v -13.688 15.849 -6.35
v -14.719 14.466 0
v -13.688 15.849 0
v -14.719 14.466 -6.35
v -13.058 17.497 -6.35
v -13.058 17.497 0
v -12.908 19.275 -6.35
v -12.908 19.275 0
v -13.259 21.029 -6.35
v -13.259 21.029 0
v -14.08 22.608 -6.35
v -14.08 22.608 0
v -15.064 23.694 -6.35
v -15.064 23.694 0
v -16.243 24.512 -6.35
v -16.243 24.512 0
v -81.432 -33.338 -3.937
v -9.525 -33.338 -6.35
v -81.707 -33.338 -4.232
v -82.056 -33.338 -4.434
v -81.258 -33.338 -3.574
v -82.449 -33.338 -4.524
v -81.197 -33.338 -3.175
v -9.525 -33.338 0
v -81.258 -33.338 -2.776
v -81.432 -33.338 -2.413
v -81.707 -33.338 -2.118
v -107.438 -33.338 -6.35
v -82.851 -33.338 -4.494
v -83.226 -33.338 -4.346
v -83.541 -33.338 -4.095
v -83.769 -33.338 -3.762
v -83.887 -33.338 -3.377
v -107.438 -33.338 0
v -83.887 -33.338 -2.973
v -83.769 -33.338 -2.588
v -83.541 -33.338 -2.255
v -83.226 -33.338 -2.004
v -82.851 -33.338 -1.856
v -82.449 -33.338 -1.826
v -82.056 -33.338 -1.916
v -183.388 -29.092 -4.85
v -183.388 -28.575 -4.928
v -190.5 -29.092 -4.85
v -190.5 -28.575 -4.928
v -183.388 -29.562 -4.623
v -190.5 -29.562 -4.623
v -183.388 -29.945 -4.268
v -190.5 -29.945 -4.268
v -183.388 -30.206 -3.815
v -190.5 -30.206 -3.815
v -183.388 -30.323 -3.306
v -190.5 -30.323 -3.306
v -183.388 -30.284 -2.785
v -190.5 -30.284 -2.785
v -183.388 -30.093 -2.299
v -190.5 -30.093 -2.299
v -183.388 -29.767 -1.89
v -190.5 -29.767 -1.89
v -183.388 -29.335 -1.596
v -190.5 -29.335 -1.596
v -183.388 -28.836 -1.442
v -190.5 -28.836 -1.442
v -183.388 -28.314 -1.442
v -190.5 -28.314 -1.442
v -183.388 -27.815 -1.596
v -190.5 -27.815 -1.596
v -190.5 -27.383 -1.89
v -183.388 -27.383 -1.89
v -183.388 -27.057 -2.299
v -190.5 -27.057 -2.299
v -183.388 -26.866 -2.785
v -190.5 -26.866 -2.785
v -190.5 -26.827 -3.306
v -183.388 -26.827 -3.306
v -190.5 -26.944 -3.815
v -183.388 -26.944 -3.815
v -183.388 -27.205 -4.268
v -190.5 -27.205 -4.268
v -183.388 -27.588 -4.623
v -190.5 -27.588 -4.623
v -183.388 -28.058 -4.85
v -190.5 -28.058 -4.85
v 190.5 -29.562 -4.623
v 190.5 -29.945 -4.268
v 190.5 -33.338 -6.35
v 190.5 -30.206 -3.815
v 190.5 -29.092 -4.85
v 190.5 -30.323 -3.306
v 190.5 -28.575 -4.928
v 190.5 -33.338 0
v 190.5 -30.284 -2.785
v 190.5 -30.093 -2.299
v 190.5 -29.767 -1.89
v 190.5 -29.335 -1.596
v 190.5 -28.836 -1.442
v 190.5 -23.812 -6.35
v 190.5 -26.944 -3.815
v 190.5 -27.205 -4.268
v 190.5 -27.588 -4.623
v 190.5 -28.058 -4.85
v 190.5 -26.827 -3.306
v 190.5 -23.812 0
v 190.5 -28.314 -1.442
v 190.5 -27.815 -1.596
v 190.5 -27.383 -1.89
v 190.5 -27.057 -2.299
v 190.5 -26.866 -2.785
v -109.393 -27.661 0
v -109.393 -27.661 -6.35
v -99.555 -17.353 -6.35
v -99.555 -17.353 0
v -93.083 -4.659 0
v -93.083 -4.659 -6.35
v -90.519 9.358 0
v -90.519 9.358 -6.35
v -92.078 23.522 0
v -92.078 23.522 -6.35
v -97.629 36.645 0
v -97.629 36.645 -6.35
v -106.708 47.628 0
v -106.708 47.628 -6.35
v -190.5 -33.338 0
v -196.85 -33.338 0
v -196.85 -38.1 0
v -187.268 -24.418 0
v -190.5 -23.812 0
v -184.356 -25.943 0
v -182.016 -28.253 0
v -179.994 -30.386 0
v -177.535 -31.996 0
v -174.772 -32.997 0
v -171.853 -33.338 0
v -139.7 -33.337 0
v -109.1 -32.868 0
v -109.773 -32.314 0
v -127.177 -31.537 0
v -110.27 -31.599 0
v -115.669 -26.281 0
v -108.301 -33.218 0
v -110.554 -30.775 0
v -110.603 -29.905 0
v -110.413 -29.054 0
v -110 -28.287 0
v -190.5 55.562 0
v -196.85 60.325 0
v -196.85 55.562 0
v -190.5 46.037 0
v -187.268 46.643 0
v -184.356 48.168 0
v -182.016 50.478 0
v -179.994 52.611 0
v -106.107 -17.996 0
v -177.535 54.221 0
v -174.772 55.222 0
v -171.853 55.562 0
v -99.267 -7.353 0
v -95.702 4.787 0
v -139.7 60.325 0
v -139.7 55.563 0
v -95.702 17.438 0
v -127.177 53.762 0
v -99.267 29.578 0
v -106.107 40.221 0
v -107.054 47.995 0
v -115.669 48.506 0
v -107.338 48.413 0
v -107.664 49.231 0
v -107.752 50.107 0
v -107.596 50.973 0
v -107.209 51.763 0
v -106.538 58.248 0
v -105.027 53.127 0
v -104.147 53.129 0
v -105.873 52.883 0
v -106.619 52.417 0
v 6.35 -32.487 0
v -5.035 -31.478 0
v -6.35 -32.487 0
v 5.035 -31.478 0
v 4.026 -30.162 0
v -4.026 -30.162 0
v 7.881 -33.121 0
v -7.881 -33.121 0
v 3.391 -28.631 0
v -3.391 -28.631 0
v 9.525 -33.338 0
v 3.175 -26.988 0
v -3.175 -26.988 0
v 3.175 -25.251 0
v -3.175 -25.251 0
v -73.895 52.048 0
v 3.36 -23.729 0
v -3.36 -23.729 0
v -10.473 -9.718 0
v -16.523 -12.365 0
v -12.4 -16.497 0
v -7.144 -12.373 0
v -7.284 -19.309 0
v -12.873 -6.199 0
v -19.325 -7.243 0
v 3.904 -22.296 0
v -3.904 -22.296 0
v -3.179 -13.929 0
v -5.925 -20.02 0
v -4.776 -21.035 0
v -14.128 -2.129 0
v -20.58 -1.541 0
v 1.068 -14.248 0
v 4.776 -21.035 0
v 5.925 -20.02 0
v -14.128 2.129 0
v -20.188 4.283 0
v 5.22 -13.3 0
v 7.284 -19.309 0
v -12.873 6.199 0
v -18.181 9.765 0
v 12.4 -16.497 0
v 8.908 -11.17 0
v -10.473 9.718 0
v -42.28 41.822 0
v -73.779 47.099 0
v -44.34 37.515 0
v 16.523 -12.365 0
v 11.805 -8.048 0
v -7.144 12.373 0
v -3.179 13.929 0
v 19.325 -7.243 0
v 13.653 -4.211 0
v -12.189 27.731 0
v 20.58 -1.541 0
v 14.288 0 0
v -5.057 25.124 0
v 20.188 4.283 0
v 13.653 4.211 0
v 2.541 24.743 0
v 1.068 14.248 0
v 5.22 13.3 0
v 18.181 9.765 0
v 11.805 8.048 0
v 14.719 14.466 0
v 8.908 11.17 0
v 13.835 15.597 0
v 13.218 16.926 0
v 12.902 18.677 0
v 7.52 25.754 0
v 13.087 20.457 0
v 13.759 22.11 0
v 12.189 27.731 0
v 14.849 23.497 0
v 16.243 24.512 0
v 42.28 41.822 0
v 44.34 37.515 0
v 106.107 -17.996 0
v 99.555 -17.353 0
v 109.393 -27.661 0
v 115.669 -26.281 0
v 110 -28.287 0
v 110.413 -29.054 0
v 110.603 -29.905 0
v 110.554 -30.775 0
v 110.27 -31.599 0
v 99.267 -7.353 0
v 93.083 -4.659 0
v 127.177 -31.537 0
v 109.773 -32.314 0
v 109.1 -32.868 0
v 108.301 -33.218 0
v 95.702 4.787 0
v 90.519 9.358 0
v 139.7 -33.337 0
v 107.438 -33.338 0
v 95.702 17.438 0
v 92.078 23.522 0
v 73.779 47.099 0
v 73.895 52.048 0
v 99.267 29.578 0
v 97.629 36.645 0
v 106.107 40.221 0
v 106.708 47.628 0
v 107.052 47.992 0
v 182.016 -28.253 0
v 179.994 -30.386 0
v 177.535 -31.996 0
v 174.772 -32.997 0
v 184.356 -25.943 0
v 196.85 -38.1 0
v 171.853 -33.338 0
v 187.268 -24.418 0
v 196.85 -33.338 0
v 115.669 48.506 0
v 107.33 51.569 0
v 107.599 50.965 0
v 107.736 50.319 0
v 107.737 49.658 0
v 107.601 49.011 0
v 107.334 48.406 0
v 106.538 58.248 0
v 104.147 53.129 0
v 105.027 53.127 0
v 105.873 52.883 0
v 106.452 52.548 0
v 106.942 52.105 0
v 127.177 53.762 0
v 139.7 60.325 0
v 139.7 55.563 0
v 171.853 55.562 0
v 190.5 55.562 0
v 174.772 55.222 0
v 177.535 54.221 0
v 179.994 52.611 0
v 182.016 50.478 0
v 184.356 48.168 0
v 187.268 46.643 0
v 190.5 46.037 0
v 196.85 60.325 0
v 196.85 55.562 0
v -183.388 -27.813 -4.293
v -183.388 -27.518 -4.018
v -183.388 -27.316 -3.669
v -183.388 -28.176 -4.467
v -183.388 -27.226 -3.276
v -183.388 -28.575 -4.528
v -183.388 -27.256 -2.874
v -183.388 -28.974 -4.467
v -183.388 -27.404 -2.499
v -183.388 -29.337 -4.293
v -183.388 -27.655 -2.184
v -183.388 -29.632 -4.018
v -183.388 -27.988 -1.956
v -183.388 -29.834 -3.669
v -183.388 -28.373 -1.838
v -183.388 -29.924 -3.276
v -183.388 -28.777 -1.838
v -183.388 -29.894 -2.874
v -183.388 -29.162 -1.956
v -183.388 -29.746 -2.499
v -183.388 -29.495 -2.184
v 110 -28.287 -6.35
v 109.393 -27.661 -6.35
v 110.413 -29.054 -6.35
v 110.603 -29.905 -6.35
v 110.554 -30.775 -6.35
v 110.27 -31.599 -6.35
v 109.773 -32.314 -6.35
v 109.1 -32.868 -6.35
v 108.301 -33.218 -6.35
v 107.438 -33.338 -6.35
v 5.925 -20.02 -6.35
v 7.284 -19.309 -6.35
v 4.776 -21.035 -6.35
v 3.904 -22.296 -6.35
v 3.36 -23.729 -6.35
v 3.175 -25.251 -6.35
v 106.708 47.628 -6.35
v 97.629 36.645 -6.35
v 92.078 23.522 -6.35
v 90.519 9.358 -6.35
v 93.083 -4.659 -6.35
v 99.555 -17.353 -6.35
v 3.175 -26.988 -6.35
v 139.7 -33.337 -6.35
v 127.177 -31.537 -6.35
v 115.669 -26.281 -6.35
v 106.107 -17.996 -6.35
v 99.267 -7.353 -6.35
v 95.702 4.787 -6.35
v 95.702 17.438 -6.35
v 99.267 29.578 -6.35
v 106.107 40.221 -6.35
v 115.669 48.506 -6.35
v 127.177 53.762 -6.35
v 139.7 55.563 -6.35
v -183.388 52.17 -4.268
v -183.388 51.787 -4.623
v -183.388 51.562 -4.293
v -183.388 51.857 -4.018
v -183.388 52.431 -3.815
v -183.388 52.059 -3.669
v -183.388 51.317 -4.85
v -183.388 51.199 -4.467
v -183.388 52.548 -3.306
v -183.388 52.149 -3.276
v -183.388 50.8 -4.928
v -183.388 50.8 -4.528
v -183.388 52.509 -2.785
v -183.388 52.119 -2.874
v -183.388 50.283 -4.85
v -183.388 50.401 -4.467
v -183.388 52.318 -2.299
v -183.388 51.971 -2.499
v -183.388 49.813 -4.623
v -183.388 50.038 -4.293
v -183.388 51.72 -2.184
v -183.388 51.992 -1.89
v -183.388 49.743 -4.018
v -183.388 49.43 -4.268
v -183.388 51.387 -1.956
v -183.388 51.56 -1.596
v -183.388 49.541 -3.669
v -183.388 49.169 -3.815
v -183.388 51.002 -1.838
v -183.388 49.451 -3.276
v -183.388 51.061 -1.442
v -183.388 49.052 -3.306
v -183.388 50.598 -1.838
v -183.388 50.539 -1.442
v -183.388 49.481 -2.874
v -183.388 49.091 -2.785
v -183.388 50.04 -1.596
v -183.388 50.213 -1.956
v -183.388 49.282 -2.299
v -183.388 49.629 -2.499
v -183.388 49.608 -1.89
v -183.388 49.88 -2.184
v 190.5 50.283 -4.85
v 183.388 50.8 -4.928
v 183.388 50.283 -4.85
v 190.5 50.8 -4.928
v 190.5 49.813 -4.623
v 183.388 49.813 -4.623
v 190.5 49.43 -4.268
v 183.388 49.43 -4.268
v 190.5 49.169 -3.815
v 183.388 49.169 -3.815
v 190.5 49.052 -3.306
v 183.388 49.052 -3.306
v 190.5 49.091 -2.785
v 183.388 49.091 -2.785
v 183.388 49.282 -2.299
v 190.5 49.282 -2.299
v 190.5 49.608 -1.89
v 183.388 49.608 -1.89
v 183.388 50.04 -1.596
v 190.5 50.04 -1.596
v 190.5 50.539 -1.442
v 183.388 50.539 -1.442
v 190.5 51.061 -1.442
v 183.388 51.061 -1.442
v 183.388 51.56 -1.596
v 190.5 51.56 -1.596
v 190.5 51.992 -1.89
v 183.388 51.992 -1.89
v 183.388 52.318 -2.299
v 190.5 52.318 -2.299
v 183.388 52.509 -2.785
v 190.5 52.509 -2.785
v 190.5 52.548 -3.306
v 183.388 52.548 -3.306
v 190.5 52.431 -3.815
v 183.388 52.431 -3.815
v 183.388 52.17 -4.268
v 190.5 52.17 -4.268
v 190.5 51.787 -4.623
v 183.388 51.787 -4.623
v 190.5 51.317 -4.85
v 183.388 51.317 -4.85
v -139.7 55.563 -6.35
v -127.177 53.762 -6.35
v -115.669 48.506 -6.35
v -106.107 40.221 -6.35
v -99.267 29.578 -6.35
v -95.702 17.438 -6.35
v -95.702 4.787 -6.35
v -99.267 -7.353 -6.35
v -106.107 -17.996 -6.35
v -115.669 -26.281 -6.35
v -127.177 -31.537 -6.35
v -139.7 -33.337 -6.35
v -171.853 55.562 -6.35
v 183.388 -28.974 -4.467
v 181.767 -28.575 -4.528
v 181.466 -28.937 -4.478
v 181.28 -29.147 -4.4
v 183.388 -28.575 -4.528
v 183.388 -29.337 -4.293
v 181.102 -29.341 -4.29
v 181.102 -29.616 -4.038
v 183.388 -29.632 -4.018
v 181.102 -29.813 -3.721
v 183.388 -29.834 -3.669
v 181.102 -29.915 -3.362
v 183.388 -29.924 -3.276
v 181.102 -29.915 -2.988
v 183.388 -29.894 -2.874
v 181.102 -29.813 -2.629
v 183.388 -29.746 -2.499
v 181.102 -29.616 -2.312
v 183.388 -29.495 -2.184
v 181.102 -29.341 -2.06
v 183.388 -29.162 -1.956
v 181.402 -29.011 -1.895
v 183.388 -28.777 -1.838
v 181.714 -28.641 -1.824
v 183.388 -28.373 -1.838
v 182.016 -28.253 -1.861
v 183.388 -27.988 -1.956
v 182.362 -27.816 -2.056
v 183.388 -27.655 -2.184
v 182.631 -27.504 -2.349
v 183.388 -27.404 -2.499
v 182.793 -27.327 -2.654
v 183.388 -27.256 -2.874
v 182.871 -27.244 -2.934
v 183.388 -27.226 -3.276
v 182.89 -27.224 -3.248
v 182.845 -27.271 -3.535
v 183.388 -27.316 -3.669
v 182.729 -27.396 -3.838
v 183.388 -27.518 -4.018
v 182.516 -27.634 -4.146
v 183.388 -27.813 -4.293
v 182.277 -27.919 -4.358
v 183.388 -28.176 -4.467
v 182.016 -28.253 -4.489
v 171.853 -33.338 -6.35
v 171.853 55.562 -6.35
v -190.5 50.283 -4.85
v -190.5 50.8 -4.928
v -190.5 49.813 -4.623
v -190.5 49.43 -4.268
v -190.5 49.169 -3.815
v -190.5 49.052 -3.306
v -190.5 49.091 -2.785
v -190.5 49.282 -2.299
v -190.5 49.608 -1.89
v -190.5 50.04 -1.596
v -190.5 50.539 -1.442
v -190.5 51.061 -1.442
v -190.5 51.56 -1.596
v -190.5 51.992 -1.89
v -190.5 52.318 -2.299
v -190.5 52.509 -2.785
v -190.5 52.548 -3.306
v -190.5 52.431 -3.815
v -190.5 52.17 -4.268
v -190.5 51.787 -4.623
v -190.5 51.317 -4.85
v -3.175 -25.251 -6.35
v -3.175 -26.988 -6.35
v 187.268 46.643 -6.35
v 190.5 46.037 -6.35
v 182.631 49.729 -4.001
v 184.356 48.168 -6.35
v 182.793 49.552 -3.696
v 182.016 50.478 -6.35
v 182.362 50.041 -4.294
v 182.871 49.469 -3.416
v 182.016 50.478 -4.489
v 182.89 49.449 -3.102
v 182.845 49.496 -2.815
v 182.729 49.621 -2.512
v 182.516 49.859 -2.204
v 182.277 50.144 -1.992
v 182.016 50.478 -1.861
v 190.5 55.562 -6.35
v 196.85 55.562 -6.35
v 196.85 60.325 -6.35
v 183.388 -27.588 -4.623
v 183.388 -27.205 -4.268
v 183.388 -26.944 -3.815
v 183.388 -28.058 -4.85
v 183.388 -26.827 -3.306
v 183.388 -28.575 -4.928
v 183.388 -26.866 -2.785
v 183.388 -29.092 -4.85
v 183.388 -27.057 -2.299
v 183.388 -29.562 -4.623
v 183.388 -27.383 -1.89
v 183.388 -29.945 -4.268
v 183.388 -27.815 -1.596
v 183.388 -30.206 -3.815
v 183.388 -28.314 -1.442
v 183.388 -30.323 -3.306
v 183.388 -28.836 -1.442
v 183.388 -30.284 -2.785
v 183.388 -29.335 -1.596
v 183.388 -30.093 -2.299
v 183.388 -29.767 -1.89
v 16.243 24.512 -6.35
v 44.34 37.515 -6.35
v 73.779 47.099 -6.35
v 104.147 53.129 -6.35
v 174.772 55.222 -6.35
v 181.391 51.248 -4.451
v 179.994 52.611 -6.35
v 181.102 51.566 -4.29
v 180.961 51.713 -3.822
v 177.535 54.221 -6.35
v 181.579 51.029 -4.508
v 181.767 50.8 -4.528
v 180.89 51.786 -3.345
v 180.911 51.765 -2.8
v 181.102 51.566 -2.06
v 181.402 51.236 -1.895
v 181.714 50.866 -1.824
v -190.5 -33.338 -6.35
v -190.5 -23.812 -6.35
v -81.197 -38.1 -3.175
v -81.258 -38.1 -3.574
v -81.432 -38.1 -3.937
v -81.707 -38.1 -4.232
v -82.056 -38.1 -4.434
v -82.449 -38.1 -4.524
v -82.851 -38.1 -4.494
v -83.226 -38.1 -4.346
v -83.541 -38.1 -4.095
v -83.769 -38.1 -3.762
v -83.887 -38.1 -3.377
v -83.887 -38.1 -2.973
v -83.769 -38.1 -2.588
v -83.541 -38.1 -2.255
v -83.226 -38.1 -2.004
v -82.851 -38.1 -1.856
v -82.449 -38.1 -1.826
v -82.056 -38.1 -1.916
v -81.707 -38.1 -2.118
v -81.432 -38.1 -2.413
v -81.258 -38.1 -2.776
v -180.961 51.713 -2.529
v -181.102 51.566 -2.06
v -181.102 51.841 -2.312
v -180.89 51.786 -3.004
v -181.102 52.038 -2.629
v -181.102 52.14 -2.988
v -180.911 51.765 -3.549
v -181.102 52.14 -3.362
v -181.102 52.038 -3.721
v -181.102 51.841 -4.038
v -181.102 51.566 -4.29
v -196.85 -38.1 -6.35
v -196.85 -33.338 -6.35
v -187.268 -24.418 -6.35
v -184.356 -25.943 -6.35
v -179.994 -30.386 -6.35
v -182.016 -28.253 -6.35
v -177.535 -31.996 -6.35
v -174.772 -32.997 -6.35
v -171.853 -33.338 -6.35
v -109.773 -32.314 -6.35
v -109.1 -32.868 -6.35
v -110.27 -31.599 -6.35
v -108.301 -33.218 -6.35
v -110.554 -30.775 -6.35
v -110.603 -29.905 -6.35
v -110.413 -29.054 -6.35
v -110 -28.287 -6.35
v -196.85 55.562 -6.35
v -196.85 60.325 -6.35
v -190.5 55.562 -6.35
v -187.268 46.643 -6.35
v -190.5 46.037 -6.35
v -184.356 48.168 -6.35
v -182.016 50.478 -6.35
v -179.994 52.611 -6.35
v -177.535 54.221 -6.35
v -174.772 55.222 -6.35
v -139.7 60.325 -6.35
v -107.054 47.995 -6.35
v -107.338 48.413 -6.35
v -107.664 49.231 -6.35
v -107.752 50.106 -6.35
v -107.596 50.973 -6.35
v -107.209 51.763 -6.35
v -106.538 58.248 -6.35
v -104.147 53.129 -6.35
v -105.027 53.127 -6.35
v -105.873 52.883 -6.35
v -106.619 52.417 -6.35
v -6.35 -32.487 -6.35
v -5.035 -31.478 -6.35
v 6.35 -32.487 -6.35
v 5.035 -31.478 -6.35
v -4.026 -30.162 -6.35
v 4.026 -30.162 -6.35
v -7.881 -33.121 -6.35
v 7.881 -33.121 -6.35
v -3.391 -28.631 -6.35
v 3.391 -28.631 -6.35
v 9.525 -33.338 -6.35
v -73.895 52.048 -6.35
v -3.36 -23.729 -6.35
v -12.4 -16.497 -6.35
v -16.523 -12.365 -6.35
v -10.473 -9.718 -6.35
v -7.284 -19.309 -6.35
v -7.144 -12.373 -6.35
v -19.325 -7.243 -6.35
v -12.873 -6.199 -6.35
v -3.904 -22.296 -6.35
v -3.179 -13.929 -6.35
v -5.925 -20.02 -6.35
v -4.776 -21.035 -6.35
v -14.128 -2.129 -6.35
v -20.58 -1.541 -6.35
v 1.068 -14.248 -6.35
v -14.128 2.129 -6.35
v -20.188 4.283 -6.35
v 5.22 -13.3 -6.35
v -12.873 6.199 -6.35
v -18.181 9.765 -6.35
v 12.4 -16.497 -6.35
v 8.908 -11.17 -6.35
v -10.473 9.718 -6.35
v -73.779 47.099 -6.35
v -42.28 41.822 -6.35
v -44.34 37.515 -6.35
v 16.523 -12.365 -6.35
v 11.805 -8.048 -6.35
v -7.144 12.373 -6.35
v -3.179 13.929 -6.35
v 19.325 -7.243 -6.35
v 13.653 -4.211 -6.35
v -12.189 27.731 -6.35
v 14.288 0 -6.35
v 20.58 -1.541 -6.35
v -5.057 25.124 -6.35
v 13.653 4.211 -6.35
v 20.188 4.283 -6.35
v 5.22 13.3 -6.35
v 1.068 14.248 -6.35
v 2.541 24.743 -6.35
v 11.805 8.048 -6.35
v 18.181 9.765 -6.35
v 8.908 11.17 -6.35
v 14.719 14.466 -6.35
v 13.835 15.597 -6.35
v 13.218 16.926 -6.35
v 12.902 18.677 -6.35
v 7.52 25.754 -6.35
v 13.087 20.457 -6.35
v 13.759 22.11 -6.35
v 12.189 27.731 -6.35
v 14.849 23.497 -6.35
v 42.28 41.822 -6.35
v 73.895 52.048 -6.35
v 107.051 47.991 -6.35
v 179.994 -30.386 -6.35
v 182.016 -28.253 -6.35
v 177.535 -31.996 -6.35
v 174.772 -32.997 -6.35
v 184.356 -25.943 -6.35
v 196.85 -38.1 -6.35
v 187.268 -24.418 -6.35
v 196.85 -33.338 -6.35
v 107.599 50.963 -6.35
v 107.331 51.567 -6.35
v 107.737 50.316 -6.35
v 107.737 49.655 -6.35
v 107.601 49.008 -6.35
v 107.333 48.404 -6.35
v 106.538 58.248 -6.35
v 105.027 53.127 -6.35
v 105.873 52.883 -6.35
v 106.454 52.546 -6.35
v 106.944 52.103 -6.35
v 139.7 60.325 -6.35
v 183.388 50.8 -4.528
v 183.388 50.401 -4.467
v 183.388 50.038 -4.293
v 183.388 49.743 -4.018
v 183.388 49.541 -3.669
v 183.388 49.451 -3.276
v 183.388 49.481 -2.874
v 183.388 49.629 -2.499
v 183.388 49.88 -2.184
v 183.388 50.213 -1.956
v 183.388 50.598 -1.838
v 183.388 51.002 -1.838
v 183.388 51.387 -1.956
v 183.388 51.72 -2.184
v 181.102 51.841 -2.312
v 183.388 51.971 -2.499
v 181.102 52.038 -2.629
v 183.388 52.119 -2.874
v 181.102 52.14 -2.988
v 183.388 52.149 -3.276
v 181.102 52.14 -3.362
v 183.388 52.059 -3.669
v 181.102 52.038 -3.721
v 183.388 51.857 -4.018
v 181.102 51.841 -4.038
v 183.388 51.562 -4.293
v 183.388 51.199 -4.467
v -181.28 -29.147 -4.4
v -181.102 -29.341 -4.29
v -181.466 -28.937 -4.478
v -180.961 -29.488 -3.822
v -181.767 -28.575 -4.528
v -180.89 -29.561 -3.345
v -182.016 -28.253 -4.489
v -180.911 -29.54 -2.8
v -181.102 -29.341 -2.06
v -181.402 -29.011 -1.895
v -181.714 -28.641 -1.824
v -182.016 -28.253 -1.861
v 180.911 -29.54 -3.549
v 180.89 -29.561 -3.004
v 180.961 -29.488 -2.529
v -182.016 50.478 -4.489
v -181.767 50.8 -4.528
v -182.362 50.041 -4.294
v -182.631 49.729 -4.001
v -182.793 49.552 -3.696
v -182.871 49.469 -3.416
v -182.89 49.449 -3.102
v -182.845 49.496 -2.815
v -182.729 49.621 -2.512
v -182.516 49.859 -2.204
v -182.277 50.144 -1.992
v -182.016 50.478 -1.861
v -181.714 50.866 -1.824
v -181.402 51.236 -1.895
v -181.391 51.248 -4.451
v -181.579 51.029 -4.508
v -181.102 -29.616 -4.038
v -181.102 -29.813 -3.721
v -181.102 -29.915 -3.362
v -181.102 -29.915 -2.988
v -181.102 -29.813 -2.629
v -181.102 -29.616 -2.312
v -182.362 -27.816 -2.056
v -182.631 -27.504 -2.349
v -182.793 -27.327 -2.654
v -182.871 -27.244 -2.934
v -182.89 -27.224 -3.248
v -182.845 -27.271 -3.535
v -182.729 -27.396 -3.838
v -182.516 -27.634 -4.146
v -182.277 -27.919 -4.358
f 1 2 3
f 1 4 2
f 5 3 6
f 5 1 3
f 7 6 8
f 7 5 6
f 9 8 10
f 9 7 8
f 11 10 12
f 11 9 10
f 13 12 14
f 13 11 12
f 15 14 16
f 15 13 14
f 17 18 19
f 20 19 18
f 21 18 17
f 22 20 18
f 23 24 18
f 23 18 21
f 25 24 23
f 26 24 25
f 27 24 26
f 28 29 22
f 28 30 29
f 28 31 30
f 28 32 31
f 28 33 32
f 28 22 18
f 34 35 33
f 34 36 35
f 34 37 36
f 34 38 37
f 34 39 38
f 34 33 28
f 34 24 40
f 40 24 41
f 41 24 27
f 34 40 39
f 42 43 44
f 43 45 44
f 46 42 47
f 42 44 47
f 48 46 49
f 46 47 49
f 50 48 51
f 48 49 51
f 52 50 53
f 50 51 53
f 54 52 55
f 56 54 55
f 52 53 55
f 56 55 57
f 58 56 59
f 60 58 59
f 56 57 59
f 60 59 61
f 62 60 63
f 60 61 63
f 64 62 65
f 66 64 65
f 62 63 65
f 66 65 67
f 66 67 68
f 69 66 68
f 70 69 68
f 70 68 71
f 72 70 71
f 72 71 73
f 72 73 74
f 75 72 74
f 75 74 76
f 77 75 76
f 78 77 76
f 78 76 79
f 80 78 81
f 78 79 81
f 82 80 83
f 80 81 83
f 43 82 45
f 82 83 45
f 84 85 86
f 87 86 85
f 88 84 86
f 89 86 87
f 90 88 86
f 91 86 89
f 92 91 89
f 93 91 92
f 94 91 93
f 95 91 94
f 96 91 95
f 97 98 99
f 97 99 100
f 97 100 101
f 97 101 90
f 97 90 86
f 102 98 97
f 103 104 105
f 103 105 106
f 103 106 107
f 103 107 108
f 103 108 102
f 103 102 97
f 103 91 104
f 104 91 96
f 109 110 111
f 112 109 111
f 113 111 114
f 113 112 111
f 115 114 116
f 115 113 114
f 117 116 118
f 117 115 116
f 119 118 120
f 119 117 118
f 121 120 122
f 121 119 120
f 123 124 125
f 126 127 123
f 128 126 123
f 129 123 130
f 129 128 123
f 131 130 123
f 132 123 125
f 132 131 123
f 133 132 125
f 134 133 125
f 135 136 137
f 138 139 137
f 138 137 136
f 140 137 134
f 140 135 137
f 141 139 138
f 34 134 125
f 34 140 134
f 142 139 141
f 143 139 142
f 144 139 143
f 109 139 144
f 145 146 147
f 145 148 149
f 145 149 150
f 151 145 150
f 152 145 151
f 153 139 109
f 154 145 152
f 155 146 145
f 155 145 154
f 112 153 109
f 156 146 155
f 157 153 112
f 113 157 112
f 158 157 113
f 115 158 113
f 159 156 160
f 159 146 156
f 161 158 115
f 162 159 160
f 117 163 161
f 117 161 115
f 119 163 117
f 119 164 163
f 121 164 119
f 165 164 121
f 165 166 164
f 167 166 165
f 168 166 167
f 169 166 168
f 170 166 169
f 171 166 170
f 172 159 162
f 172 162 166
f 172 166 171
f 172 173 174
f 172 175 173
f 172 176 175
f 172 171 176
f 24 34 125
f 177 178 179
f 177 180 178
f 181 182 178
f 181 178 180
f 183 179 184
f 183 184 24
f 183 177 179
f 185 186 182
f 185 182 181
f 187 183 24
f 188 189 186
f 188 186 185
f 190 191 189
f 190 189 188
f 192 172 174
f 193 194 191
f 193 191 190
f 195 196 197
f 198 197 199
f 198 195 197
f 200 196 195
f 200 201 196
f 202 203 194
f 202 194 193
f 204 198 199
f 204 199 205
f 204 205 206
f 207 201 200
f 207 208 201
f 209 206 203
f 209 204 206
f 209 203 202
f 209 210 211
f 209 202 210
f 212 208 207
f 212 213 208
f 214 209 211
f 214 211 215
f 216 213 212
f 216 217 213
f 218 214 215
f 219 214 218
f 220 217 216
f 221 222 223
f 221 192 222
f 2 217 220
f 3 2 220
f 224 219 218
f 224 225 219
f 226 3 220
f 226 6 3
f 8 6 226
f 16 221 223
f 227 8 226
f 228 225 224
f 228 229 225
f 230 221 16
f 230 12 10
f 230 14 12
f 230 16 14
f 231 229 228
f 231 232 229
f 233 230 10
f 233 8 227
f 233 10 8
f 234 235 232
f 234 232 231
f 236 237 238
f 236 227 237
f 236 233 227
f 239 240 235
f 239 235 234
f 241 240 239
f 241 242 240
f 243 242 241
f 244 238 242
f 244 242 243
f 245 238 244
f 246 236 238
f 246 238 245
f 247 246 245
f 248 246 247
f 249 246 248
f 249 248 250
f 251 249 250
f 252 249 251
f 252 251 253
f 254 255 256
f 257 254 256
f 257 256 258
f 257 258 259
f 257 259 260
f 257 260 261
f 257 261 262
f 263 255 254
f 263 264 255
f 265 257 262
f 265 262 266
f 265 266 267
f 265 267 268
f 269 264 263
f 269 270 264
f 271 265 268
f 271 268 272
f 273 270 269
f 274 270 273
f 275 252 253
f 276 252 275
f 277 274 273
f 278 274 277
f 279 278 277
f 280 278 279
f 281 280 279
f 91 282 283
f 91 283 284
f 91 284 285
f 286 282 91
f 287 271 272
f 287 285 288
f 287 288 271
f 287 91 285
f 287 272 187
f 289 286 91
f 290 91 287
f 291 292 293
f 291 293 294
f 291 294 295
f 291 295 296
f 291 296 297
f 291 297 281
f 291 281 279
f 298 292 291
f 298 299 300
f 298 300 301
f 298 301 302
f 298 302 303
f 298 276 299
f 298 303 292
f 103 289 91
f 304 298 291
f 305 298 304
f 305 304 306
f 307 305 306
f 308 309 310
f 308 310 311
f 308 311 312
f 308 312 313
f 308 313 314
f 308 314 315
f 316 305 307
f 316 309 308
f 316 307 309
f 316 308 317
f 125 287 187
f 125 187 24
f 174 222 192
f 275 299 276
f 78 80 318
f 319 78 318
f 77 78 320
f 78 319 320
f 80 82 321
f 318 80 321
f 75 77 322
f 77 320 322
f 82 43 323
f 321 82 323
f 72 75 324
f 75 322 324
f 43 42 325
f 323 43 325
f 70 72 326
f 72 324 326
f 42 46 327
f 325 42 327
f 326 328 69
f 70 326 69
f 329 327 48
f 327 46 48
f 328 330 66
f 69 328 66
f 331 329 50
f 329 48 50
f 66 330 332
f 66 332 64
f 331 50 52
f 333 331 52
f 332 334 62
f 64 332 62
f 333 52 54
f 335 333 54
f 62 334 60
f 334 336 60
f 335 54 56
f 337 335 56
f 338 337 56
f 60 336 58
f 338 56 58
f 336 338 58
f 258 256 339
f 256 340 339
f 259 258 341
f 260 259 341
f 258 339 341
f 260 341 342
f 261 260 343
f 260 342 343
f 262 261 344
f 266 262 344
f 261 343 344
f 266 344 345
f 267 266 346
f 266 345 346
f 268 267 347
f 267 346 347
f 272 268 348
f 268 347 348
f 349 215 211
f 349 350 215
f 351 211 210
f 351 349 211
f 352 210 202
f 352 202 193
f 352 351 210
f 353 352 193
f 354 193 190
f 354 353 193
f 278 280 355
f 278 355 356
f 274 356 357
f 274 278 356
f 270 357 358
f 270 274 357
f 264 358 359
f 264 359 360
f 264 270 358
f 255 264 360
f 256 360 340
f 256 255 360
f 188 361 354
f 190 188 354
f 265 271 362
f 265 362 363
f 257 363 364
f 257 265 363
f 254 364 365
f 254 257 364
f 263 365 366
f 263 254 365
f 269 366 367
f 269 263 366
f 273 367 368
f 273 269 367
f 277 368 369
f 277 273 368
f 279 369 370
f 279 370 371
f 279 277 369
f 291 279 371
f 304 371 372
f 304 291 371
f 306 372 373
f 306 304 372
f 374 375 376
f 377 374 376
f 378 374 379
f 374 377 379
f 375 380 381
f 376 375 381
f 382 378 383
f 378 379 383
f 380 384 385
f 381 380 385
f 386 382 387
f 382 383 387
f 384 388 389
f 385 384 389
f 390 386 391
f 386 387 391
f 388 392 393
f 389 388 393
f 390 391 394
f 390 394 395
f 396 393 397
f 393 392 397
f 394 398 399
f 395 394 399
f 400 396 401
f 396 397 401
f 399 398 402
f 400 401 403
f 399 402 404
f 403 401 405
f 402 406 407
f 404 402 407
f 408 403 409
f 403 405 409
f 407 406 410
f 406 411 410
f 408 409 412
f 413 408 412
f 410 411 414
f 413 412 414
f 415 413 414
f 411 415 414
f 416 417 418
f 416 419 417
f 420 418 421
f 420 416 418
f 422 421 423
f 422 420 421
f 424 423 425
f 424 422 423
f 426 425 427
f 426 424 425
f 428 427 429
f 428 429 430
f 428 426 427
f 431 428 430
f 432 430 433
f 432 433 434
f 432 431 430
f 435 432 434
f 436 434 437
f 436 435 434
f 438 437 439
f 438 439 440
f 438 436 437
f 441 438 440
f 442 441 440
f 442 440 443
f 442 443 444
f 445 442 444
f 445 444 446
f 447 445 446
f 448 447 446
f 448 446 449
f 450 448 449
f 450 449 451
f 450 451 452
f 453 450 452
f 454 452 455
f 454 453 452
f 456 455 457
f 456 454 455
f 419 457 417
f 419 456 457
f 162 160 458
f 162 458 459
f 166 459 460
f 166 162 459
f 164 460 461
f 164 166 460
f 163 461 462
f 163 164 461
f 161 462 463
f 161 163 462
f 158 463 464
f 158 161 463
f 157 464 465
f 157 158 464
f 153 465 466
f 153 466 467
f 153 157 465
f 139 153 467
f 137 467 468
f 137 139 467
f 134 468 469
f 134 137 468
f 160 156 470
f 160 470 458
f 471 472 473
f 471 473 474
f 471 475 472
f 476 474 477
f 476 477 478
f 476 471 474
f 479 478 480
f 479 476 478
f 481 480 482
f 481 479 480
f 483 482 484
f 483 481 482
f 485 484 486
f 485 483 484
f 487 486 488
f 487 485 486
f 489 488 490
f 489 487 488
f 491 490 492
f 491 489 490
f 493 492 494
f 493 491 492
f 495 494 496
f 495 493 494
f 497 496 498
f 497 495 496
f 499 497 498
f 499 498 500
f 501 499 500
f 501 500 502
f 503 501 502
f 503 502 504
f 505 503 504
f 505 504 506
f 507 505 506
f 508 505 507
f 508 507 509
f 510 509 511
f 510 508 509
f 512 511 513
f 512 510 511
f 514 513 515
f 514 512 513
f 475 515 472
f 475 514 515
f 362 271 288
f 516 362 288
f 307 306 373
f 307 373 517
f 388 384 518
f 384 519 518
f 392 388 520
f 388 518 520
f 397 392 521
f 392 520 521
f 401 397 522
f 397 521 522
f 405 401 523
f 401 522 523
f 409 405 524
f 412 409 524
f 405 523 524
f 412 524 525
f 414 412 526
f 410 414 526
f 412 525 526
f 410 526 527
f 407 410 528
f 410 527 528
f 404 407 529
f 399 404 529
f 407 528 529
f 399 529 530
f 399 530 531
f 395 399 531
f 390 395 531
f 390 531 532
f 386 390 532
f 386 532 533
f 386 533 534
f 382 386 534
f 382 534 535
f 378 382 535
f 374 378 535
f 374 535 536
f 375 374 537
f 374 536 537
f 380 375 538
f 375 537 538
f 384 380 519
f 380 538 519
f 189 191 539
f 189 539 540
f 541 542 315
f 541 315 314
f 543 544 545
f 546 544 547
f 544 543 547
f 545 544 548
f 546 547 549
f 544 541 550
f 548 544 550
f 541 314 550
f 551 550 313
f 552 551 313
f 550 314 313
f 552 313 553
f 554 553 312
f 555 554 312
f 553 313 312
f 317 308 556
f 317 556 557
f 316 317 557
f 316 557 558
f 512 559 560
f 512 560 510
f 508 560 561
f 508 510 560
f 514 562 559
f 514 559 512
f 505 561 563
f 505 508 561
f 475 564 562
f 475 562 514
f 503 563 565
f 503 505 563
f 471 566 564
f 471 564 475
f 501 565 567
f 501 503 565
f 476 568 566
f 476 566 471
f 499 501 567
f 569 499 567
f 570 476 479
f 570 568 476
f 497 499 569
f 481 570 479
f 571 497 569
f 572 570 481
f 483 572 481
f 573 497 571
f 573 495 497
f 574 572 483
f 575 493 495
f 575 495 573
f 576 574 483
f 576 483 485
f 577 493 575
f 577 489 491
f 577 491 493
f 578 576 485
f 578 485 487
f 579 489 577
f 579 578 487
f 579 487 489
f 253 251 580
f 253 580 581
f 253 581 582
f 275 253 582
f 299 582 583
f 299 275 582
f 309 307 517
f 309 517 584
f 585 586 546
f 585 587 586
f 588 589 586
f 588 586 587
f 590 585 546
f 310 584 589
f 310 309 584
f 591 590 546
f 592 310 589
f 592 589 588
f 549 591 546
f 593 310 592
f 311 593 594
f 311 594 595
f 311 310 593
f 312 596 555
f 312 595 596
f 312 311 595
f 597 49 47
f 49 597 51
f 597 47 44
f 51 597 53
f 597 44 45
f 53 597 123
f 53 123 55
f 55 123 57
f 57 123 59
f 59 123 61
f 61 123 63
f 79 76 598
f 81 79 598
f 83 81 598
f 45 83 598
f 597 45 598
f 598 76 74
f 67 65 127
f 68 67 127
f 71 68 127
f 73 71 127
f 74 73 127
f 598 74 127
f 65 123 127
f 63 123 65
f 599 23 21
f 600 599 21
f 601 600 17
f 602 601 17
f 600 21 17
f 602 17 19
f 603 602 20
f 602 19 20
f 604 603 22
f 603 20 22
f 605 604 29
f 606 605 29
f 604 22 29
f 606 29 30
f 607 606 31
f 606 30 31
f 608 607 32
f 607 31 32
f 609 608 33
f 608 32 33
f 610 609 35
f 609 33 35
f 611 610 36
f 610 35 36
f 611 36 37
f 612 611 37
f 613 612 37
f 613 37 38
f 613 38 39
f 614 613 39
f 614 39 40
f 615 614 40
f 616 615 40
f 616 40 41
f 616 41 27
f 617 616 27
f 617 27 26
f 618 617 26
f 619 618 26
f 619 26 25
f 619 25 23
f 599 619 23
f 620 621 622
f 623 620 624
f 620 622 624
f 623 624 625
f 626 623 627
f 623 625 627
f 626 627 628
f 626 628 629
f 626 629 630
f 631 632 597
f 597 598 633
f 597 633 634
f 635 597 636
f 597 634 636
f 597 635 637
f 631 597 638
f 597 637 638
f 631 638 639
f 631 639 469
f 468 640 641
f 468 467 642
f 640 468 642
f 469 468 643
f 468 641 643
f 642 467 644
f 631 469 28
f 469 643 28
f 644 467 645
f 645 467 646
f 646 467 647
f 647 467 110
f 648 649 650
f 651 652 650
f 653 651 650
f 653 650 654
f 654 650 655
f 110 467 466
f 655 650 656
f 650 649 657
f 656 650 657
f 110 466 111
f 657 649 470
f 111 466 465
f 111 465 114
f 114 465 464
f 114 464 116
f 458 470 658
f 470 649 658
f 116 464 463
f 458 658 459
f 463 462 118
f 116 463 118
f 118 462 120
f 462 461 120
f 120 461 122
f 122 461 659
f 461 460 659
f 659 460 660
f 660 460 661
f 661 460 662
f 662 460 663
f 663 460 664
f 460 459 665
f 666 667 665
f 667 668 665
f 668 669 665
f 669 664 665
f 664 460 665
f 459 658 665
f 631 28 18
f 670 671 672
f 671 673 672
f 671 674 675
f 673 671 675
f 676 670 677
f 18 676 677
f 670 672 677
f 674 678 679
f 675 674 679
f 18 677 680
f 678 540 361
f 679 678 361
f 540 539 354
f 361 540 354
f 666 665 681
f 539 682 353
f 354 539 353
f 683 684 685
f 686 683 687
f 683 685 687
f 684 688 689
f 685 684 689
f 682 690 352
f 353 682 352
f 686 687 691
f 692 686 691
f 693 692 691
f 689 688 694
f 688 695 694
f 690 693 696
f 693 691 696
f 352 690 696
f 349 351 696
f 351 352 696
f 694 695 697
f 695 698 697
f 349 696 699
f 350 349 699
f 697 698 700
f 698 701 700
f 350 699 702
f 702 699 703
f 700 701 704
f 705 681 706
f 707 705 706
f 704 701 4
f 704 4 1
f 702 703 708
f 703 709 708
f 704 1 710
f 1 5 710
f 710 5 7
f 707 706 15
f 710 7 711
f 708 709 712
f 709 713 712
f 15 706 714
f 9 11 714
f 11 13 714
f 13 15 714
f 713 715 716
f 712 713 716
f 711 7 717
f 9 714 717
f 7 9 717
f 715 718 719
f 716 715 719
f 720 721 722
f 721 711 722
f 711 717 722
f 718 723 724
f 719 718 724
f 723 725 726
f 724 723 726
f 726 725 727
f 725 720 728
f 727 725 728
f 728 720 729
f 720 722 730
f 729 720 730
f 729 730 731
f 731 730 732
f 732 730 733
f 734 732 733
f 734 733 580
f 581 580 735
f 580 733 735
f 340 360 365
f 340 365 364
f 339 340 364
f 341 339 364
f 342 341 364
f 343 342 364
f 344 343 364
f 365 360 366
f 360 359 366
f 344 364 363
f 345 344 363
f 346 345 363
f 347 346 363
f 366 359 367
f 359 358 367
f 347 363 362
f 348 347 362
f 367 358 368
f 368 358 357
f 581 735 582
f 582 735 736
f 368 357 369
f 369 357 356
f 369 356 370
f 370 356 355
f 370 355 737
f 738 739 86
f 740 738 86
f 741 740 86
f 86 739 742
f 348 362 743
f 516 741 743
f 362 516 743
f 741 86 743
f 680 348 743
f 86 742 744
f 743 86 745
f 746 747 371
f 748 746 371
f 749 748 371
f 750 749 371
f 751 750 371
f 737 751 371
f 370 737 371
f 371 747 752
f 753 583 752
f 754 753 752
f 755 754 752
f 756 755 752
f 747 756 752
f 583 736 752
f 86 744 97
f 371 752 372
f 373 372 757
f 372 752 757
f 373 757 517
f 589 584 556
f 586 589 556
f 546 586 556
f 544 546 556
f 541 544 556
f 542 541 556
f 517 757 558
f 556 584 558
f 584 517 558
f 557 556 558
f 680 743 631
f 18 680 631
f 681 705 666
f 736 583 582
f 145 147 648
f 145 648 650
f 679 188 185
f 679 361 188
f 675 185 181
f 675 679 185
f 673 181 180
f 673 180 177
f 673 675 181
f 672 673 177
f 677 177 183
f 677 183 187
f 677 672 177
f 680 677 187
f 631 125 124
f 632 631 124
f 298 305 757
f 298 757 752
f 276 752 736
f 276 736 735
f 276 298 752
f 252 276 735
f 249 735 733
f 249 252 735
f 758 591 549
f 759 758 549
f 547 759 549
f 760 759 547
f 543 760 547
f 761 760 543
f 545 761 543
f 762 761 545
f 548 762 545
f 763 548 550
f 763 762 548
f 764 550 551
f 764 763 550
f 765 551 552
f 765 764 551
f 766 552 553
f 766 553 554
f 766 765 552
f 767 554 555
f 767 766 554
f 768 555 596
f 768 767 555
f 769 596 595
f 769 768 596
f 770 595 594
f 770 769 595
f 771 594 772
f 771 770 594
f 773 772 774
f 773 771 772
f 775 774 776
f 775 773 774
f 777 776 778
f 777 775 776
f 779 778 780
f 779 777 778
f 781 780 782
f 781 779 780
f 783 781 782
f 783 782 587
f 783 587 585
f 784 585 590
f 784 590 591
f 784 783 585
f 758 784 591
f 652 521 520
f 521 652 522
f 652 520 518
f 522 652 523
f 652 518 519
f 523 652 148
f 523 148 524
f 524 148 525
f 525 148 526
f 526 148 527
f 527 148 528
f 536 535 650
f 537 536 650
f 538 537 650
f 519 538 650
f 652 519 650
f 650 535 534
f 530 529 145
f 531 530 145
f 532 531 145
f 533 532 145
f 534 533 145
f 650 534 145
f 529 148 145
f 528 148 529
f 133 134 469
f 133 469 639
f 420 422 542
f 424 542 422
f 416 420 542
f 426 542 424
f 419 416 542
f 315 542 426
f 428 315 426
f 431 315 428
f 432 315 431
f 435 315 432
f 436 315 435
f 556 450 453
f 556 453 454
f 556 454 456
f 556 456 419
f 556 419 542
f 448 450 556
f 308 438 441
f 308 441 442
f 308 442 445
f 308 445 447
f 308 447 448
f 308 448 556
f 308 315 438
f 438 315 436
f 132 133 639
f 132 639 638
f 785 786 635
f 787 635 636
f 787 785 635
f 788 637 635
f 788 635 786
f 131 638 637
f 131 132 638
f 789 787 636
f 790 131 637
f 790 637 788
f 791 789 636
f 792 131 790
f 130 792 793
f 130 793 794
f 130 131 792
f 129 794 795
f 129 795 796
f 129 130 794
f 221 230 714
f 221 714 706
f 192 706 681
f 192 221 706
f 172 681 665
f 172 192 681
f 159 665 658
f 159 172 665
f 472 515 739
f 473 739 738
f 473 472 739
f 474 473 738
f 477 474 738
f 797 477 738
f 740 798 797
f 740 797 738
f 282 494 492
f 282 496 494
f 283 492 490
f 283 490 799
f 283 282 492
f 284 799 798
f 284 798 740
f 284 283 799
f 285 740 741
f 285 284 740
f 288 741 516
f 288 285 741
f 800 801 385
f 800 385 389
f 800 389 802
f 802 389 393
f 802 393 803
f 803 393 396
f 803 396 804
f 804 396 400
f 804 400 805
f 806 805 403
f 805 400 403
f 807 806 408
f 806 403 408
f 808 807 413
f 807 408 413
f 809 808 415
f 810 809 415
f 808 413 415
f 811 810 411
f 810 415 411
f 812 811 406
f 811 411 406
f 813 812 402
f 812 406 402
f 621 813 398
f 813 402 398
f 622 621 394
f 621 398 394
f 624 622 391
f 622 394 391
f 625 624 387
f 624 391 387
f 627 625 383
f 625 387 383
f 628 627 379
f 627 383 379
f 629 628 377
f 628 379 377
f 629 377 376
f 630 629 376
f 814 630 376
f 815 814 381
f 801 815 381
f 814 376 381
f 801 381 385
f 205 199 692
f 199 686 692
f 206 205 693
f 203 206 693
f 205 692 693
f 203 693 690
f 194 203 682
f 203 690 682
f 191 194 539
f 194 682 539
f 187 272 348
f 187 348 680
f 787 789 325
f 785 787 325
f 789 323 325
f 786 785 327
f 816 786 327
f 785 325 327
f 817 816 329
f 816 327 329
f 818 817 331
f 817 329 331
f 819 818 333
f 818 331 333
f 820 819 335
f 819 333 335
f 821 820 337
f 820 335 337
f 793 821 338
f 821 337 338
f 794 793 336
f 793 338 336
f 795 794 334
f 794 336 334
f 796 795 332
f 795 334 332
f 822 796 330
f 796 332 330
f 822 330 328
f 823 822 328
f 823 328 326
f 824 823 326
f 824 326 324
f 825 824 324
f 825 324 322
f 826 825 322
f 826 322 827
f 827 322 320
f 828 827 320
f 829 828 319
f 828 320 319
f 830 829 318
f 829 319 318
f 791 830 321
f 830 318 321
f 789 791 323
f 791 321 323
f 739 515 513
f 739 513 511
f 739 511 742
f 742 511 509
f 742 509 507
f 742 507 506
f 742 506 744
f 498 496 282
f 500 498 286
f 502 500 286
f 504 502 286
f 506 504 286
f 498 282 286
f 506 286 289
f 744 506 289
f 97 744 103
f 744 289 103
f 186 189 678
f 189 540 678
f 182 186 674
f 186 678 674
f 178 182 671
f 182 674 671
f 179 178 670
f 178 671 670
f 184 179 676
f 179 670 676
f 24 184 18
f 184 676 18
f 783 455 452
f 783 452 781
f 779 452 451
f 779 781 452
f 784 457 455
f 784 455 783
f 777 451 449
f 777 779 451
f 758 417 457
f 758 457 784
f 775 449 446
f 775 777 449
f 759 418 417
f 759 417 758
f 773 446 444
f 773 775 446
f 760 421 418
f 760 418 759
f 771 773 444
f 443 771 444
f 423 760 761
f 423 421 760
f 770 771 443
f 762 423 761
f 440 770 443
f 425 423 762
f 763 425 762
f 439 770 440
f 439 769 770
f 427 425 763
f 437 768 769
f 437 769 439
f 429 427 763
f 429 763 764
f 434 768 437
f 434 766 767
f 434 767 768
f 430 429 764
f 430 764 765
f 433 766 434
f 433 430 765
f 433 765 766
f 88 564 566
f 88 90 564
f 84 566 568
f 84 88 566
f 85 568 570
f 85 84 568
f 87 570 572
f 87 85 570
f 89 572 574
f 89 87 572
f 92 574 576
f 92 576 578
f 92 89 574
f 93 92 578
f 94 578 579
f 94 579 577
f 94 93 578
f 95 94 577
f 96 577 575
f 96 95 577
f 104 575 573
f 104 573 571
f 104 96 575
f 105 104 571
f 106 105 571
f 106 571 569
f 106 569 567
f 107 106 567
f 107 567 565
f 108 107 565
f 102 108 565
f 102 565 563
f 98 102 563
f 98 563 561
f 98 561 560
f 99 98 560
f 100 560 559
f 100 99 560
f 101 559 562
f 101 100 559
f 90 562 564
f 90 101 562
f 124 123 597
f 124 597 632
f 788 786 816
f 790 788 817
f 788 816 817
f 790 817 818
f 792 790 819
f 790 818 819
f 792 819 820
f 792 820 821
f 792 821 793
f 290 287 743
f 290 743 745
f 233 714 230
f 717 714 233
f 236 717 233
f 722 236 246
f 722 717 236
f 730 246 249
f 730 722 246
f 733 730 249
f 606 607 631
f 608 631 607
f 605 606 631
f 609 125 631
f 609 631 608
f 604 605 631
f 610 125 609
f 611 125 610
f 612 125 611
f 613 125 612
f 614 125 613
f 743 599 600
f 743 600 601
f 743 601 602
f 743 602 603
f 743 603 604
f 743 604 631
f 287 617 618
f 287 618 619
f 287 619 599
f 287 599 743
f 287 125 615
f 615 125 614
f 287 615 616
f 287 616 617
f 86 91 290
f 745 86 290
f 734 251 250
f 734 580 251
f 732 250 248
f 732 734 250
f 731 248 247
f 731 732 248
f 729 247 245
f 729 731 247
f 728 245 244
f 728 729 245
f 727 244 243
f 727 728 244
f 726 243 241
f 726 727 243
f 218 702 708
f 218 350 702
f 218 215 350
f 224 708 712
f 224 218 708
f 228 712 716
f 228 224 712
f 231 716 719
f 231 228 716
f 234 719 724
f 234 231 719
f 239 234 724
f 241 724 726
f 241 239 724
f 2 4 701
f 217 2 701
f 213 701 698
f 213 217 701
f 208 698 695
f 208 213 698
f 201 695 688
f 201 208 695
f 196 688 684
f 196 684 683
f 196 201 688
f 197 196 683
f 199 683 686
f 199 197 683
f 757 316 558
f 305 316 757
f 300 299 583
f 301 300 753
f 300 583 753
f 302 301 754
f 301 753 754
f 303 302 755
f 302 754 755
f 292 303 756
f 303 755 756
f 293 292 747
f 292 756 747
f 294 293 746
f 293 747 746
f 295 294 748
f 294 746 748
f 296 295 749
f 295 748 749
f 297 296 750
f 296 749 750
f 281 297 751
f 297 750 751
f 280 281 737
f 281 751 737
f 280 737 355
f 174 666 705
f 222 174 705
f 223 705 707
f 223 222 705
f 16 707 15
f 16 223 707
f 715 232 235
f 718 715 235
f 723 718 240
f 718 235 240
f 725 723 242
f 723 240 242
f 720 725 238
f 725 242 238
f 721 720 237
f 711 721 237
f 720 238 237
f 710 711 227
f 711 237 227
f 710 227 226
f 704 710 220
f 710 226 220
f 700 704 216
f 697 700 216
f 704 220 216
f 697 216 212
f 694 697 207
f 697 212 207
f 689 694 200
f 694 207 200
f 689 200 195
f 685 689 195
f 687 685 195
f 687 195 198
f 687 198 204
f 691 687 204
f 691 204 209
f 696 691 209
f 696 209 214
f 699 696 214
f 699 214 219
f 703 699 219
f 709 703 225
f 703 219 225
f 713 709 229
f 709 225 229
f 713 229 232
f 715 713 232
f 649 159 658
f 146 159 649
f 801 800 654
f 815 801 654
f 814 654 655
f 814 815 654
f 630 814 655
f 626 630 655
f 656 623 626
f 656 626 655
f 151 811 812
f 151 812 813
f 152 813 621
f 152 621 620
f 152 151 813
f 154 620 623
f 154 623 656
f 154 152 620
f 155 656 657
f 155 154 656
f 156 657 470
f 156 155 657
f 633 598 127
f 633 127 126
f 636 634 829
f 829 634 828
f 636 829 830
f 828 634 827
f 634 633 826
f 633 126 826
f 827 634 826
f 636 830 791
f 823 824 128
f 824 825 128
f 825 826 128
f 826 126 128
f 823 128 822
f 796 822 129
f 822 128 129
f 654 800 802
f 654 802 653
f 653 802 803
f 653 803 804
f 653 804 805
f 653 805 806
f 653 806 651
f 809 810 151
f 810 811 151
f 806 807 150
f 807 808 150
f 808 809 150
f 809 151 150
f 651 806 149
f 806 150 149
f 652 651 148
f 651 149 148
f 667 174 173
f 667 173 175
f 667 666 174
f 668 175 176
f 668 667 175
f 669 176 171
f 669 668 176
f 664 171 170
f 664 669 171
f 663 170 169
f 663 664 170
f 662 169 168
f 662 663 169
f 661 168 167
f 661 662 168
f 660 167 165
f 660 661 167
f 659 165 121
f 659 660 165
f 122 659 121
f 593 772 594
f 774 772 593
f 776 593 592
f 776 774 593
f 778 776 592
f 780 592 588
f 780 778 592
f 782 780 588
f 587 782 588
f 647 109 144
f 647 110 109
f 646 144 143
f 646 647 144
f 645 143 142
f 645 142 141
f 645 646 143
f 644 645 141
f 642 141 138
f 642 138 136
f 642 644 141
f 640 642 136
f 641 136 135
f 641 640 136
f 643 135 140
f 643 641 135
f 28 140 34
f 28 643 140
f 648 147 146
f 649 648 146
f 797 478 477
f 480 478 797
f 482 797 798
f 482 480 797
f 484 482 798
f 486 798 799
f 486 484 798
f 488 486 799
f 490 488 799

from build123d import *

# Parameters (mm, degrees)
SKETCH1_W                      = 6.35
SKETCH1_H                      = 4.7625
SKETCH1_R                      = 20.6375
SKETCH1_R_2                    = 14.2875
BOSS_EXTRUDE1_DEPTH            = 6.35
SKETCH2_W                      = 6.35
SKETCH2_H                      = 9.525
BOSS_EXTRUDE2_DEPTH            = 6.35
FILLET1_R                      = 12.7
FILLET2_R                      = 11.1125
F_6_32_TAPPED_HOLE1_D          = 2.7051
F_6_32_TAPPED_HOLE1_DEPTH      = 9.398
F_6_32_TAPPED_HOLE1_TIP        = 0.81269403
FILLET3_R                      = 25.4
FILLET4_R                      = 6.35
FILLET5_R                      = 3.175
F_6_32_TAPPED_HOLE2_AT_2_COUNT = 2
F_6_32_TAPPED_HOLE2_AT_2_PITCH = 79.375


with BuildPart() as part:
    # Sketch1 → Boss-Extrude1 (new body)
    # profile 1 of 11: a face of its own
    with BuildSketch(Plane.XY):
        with Locations((-193.675, -35.71875)):
            Rectangle(SKETCH1_W, SKETCH1_H)
    # profile 2 of 11: a face of its own
    with BuildSketch(Plane.XY):
        Polygon((190.5, -38.1), (190.5, -33.3375), (-118.579686171, -33.3375), (-190.5, -33.3375), (-190.5, -38.1), align=None)
    # profile 3 of 11: a face of its own
    with BuildSketch(Plane.XY):
        with BuildLine():
            ThreePointArc((-139.7, 55.5625), (-95.25, 11.1125), (-139.7, -33.3375))
            Line((-139.7, -33.3375), (-118.579686171, -33.3375))
            ThreePointArc((-118.579686171, -33.3375), (-90.5008099, 9.968013342), (-116.535631077, 54.53233612))
            ThreePointArc((-116.535631077, 54.53233612), (-128.106367855, 55.304831818), (-139.7, 55.5625))
        make_face()
    # profile 4 of 11: a face of its own
    with BuildSketch(Plane.XY):
        with Locations((-193.675, 57.94375)):
            Rectangle(SKETCH1_W, SKETCH1_H)
    # profile 5 of 11: a face of its own
    with BuildSketch(Plane.XY):
        with BuildLine():
            Line((-190.5, 55.5625), (-139.7, 55.5625))
            ThreePointArc((-139.7, 55.5625), (-128.106367855, 55.304831818), (-116.535631077, 54.53233612))
            ThreePointArc((-116.535631077, 54.53233612), (-59.866243781, 43.050732151), (-7.116346533, 19.371732454))
            ThreePointArc((-7.116346533, 19.371732454), (-3.614019765, 20.318594129), (0, 20.6375))
            ThreePointArc((0, 20.6375), (-67.085973021, 50.210624965), (-139.7, 60.325))
            Line((-139.7, 60.325), (-190.5, 60.325))
            Line((-190.5, 60.325), (-190.5, 55.5625))
        make_face()
    # profile 6 of 11: a face of its own
    with BuildSketch(Plane.XY):
        Circle(SKETCH1_R)
        Circle(SKETCH1_R_2, mode=Mode.SUBTRACT)
    # profile 7 of 11: a face of its own
    with BuildSketch(Plane.XY):
        with BuildLine():
            Line((-3.175, -33.3375), (3.175, -33.3375))
            Line((3.175, -33.3375), (3.175, -20.391806719))
            ThreePointArc((3.175, -20.391806719), (0, -20.6375), (-3.175, -20.391806719))
            Line((-3.175, -20.391806719), (-3.175, -33.3375))
        make_face()
    # profile 8 of 11: a face of its own
    with BuildSketch(Plane.XY):
        with BuildLine():
            ThreePointArc((116.535631077, 54.53233612), (128.106367855, 55.304831818), (139.7, 55.5625))
            Line((139.7, 55.5625), (190.5, 55.5625))
            Line((190.5, 55.5625), (190.5, 60.325))
            Line((190.5, 60.325), (139.7, 60.325))
            ThreePointArc((139.7, 60.325), (67.085973021, 50.210624965), (0, 20.6375))
            ThreePointArc((0, 20.6375), (3.614019765, 20.318594129), (7.116346533, 19.371732454))
            ThreePointArc((7.116346533, 19.371732454), (59.866243781, 43.050732151), (116.535631077, 54.53233612))
        make_face()
    # profile 9 of 11: a face of its own
    with BuildSketch(Plane.XY):
        with BuildLine():
            Line((118.579686171, -33.3375), (139.7, -33.3375))
            ThreePointArc((139.7, -33.3375), (95.25, 11.1125), (139.7, 55.5625))
            ThreePointArc((139.7, 55.5625), (128.106367855, 55.304831818), (116.535631077, 54.53233612))
            ThreePointArc((116.535631077, 54.53233612), (90.5008099, 9.968013342), (118.579686171, -33.3375))
        make_face()
    # profile 10 of 11: a face of its own
    with BuildSketch(Plane.XY):
        with Locations((193.675, 57.94375)):
            Rectangle(SKETCH1_W, SKETCH1_H)
    # profile 11 of 11: a face of its own
    with BuildSketch(Plane.XY):
        with Locations((193.675, -35.71875)):
            Rectangle(SKETCH1_W, SKETCH1_H)
    extrude(amount=-BOSS_EXTRUDE1_DEPTH)

    # Sketch2 → Boss-Extrude2 (add)
    with BuildSketch(Plane.XY):
        with Locations((-187.325, -28.575)):
            Rectangle(SKETCH2_W, SKETCH2_H)
        with Locations((-187.325, 50.8)):
            Rectangle(SKETCH2_W, SKETCH2_H)
        with Locations((187.325, 50.8)):
            Rectangle(SKETCH2_W, SKETCH2_H)
        with Locations((187.325, -28.575)):
            Rectangle(SKETCH2_W, SKETCH2_H)
    extrude(amount=-BOSS_EXTRUDE2_DEPTH)

    # Fillet1
    # the kernel refuses this fillet: 12.7 mm, written as the material it adds along each edge
    with BuildSketch(Plane(origin=(-184.15, 55.5625, 0), x_dir=(1, 0, 0), z_dir=(0, 0, -1)), Plane(origin=(184.15, -33.3375, 0), x_dir=(-1, 0, 0), z_dir=(0, 0, -1))) as fillet1_piece_1:
        with BuildLine():
            CenterArc((12.296722124, 12.7), FILLET1_R, 194.477512186, 75.522487814)
            Line((0, 9.525), (-0.245934442, 9.4615))
            ThreePointArc((-0.245934442, 9.4615), (-0.254, 4.7625), (-0.254, 0))
            Line((-0.254, 0), (0, -0.254))
            Line((0, -0.254), (12.296722124, -0.254))
            Line((12.296722124, -0.254), (12.296722124, 0))
        make_face()
    extrude(amount=6.35)
    with BuildSketch(Plane(origin=(184.15, 55.5625, 0), x_dir=(-1, 0, 0), z_dir=(0, 0, -1)), Plane(origin=(-184.15, -33.3375, 0), x_dir=(1, 0, 0), z_dir=(0, 0, -1))) as fillet1_piece_2:
        with BuildLine():
            CenterArc((12.296722124, -12.7), FILLET1_R, 90, 75.522487814)
            Line((0, -9.525), (-0.245934442, -9.4615))
            ThreePointArc((-0.245934442, -9.4615), (-0.254, -4.7625), (-0.254, 0))
            Line((-0.254, 0), (0, 0.254))
            Line((0, 0.254), (12.296722124, 0.254))
            Line((12.296722124, 0.254), (12.296722124, 0))
        make_face()
    extrude(amount=6.35)

    # Fillet2
    # the kernel refuses this fillet: 11.1125 mm, written as the material it takes off along each edge
    with BuildSketch(Plane(origin=(184.15, -23.8125, 15.875), x_dir=(-0.43306748122172567, -0.9013615016785831, 0), z_dir=(0, 0, -1)), Plane(origin=(-184.15, 46.0375, 15.875), x_dir=(0.43306748122172517, 0.9013615016785834, 0), z_dir=(0, 0, -1))) as fillet2_piece_1:
        with BuildLine():
            CenterArc((7.082527166, -10.901433526), FILLET2_R, 101.184876129, 51.043876357)
            Line((-2.749978506, -5.723645536), (-2.946628619, -5.620089776))
            ThreePointArc((-2.946628619, -5.620089776), (-1.575316847, -2.76557352), (-0.200327594, 0.096249248))
            Line((-0.200327594, 0.096249248), (0.043111035, 0.218028671))
            ThreePointArc((0.043111035, 0.218028671), (2.46348771, -0.018968828), (4.883864385, 0.218028671))
            Line((4.883864385, 0.218028671), (4.92697542, 0))
        make_face()
    extrude(amount=38.1, mode=Mode.SUBTRACT)
    with BuildSketch(Plane(origin=(184.15, 46.0375, 15.875), x_dir=(1, 0, 0), z_dir=(0, 0, -1)), Plane(origin=(-184.15, -23.8125, 15.875), x_dir=(-1, 0, 0), z_dir=(0, 0, -1))) as fillet2_piece_2:
        with BuildLine():
            CenterArc((6.758920293, -11.10497368), FILLET2_R, 92.108859198, 51.043876357)
            Line((-2.133712835, -4.440985963), (-2.311565498, -4.307706209))
            ThreePointArc((-2.311565498, -4.307706209), (-1.049758647, -2.228707764), (-0.215192637, 0.0555625))
            Line((-0.215192637, 0.0555625), (0, 0.22225))
            ThreePointArc((0, 0.22225), (3.175, 0.22225), (6.341821594, 0.222099474))
            Line((6.341821594, 0.222099474), (6.35, 0))
        make_face()
    extrude(amount=38.1, mode=Mode.SUBTRACT)

    # #6-32 Tapped Hole1
    with Locations(Plane(origin=(0, -38.1, 0), x_dir=(-1, 0, 0), z_dir=(0, -1, 0))):
        with Locations((82.55, 3.175)):
            Hole(F_6_32_TAPPED_HOLE1_D / 2, depth=F_6_32_TAPPED_HOLE1_DEPTH)
            with Locations((0, 0, -(F_6_32_TAPPED_HOLE1_DEPTH + F_6_32_TAPPED_HOLE1_TIP / 2))):  # 118° drill point
                Cone(0, F_6_32_TAPPED_HOLE1_D / 2, F_6_32_TAPPED_HOLE1_TIP, mode=Mode.SUBTRACT)

    # Fillet3
    fillet3_edges = [part.edges().sort_by_distance(p)[0] for p in [
        (0, 20.6375, -3.175),
    ]]
    fillet(fillet3_edges, radius=FILLET3_R)

    # Fillet4
    fillet4_edges = [part.edges().sort_by_distance(p)[0] for p in [
        (3.175, -20.391806719, -3.175),
        (3.175, -33.3375, -3.175),
        (7.116346533, 19.371732454, -3.175),
        (-3.175, -33.3375, -3.175),
        (-3.175, -20.391806719, -3.175),
        (-7.116346533, 19.371732454, -3.175),
    ]]
    fillet(fillet4_edges, radius=FILLET4_R)

    # Fillet5
    fillet5_edges = [part.edges().sort_by_distance(p)[0] for p in [
        (118.579686171, -33.3375, -3.175),
        (116.535631077, 54.53233612, -3.175),
        (-116.535631077, 54.53233612, -3.175),
        (-118.579686171, -33.3375, -3.175),
    ]]
    fillet(fillet5_edges, radius=FILLET5_R)

    # Sketch7 → #6-32 Tapped Hole2 (revolve, cut)
    with BuildSketch(Plane(origin=(190.5, -28.575, -3.175), x_dir=(0, 0, -1), z_dir=(0, 1, 0))):
        Polygon((0, 0), (0, 10.21069403), (1.35255, 9.398), (1.35255, 7.112), (1.7526, 7.112), (1.7526, 0), align=None)
    f_6_32_tapped_hole2 = revolve(axis=Axis((196.85, -28.575, -3.175), (-1, 0, 0)), mode=Mode.SUBTRACT)

    # #6-32 Tapped Hole2 at 2: #6-32 Tapped Hole2 ×2
    with Locations(*[(0, i * F_6_32_TAPPED_HOLE2_AT_2_PITCH, 0) for i in range(1, F_6_32_TAPPED_HOLE2_AT_2_COUNT)]):
        add(f_6_32_tapped_hole2, mode=Mode.SUBTRACT)

    # Mirror1: #6-32 Tapped Hole2 across plane
    add(f_6_32_tapped_hole2.mirror(Plane(origin=(0, 0, 0), x_dir=(0, 0, 1), z_dir=(1, 0, 0))), mode=Mode.SUBTRACT)

    # Mirror1 copy 1 sketch → Mirror1 copy 1 (revolve, cut)
    with BuildSketch(Plane(origin=(-190.5, 50.8, -3.175), x_dir=(0, 0, -1), z_dir=(0, 1, 0))):
        Polygon((0, 0), (0, -10.21069403), (1.35255, -9.398), (1.35255, -7.112), (1.7526, -7.112), (1.7526, 0), align=None)
    revolve(axis=Axis((-196.85, 50.8, -3.175), (-1, 0, 0)), mode=Mode.SUBTRACT)


solid = part.part
